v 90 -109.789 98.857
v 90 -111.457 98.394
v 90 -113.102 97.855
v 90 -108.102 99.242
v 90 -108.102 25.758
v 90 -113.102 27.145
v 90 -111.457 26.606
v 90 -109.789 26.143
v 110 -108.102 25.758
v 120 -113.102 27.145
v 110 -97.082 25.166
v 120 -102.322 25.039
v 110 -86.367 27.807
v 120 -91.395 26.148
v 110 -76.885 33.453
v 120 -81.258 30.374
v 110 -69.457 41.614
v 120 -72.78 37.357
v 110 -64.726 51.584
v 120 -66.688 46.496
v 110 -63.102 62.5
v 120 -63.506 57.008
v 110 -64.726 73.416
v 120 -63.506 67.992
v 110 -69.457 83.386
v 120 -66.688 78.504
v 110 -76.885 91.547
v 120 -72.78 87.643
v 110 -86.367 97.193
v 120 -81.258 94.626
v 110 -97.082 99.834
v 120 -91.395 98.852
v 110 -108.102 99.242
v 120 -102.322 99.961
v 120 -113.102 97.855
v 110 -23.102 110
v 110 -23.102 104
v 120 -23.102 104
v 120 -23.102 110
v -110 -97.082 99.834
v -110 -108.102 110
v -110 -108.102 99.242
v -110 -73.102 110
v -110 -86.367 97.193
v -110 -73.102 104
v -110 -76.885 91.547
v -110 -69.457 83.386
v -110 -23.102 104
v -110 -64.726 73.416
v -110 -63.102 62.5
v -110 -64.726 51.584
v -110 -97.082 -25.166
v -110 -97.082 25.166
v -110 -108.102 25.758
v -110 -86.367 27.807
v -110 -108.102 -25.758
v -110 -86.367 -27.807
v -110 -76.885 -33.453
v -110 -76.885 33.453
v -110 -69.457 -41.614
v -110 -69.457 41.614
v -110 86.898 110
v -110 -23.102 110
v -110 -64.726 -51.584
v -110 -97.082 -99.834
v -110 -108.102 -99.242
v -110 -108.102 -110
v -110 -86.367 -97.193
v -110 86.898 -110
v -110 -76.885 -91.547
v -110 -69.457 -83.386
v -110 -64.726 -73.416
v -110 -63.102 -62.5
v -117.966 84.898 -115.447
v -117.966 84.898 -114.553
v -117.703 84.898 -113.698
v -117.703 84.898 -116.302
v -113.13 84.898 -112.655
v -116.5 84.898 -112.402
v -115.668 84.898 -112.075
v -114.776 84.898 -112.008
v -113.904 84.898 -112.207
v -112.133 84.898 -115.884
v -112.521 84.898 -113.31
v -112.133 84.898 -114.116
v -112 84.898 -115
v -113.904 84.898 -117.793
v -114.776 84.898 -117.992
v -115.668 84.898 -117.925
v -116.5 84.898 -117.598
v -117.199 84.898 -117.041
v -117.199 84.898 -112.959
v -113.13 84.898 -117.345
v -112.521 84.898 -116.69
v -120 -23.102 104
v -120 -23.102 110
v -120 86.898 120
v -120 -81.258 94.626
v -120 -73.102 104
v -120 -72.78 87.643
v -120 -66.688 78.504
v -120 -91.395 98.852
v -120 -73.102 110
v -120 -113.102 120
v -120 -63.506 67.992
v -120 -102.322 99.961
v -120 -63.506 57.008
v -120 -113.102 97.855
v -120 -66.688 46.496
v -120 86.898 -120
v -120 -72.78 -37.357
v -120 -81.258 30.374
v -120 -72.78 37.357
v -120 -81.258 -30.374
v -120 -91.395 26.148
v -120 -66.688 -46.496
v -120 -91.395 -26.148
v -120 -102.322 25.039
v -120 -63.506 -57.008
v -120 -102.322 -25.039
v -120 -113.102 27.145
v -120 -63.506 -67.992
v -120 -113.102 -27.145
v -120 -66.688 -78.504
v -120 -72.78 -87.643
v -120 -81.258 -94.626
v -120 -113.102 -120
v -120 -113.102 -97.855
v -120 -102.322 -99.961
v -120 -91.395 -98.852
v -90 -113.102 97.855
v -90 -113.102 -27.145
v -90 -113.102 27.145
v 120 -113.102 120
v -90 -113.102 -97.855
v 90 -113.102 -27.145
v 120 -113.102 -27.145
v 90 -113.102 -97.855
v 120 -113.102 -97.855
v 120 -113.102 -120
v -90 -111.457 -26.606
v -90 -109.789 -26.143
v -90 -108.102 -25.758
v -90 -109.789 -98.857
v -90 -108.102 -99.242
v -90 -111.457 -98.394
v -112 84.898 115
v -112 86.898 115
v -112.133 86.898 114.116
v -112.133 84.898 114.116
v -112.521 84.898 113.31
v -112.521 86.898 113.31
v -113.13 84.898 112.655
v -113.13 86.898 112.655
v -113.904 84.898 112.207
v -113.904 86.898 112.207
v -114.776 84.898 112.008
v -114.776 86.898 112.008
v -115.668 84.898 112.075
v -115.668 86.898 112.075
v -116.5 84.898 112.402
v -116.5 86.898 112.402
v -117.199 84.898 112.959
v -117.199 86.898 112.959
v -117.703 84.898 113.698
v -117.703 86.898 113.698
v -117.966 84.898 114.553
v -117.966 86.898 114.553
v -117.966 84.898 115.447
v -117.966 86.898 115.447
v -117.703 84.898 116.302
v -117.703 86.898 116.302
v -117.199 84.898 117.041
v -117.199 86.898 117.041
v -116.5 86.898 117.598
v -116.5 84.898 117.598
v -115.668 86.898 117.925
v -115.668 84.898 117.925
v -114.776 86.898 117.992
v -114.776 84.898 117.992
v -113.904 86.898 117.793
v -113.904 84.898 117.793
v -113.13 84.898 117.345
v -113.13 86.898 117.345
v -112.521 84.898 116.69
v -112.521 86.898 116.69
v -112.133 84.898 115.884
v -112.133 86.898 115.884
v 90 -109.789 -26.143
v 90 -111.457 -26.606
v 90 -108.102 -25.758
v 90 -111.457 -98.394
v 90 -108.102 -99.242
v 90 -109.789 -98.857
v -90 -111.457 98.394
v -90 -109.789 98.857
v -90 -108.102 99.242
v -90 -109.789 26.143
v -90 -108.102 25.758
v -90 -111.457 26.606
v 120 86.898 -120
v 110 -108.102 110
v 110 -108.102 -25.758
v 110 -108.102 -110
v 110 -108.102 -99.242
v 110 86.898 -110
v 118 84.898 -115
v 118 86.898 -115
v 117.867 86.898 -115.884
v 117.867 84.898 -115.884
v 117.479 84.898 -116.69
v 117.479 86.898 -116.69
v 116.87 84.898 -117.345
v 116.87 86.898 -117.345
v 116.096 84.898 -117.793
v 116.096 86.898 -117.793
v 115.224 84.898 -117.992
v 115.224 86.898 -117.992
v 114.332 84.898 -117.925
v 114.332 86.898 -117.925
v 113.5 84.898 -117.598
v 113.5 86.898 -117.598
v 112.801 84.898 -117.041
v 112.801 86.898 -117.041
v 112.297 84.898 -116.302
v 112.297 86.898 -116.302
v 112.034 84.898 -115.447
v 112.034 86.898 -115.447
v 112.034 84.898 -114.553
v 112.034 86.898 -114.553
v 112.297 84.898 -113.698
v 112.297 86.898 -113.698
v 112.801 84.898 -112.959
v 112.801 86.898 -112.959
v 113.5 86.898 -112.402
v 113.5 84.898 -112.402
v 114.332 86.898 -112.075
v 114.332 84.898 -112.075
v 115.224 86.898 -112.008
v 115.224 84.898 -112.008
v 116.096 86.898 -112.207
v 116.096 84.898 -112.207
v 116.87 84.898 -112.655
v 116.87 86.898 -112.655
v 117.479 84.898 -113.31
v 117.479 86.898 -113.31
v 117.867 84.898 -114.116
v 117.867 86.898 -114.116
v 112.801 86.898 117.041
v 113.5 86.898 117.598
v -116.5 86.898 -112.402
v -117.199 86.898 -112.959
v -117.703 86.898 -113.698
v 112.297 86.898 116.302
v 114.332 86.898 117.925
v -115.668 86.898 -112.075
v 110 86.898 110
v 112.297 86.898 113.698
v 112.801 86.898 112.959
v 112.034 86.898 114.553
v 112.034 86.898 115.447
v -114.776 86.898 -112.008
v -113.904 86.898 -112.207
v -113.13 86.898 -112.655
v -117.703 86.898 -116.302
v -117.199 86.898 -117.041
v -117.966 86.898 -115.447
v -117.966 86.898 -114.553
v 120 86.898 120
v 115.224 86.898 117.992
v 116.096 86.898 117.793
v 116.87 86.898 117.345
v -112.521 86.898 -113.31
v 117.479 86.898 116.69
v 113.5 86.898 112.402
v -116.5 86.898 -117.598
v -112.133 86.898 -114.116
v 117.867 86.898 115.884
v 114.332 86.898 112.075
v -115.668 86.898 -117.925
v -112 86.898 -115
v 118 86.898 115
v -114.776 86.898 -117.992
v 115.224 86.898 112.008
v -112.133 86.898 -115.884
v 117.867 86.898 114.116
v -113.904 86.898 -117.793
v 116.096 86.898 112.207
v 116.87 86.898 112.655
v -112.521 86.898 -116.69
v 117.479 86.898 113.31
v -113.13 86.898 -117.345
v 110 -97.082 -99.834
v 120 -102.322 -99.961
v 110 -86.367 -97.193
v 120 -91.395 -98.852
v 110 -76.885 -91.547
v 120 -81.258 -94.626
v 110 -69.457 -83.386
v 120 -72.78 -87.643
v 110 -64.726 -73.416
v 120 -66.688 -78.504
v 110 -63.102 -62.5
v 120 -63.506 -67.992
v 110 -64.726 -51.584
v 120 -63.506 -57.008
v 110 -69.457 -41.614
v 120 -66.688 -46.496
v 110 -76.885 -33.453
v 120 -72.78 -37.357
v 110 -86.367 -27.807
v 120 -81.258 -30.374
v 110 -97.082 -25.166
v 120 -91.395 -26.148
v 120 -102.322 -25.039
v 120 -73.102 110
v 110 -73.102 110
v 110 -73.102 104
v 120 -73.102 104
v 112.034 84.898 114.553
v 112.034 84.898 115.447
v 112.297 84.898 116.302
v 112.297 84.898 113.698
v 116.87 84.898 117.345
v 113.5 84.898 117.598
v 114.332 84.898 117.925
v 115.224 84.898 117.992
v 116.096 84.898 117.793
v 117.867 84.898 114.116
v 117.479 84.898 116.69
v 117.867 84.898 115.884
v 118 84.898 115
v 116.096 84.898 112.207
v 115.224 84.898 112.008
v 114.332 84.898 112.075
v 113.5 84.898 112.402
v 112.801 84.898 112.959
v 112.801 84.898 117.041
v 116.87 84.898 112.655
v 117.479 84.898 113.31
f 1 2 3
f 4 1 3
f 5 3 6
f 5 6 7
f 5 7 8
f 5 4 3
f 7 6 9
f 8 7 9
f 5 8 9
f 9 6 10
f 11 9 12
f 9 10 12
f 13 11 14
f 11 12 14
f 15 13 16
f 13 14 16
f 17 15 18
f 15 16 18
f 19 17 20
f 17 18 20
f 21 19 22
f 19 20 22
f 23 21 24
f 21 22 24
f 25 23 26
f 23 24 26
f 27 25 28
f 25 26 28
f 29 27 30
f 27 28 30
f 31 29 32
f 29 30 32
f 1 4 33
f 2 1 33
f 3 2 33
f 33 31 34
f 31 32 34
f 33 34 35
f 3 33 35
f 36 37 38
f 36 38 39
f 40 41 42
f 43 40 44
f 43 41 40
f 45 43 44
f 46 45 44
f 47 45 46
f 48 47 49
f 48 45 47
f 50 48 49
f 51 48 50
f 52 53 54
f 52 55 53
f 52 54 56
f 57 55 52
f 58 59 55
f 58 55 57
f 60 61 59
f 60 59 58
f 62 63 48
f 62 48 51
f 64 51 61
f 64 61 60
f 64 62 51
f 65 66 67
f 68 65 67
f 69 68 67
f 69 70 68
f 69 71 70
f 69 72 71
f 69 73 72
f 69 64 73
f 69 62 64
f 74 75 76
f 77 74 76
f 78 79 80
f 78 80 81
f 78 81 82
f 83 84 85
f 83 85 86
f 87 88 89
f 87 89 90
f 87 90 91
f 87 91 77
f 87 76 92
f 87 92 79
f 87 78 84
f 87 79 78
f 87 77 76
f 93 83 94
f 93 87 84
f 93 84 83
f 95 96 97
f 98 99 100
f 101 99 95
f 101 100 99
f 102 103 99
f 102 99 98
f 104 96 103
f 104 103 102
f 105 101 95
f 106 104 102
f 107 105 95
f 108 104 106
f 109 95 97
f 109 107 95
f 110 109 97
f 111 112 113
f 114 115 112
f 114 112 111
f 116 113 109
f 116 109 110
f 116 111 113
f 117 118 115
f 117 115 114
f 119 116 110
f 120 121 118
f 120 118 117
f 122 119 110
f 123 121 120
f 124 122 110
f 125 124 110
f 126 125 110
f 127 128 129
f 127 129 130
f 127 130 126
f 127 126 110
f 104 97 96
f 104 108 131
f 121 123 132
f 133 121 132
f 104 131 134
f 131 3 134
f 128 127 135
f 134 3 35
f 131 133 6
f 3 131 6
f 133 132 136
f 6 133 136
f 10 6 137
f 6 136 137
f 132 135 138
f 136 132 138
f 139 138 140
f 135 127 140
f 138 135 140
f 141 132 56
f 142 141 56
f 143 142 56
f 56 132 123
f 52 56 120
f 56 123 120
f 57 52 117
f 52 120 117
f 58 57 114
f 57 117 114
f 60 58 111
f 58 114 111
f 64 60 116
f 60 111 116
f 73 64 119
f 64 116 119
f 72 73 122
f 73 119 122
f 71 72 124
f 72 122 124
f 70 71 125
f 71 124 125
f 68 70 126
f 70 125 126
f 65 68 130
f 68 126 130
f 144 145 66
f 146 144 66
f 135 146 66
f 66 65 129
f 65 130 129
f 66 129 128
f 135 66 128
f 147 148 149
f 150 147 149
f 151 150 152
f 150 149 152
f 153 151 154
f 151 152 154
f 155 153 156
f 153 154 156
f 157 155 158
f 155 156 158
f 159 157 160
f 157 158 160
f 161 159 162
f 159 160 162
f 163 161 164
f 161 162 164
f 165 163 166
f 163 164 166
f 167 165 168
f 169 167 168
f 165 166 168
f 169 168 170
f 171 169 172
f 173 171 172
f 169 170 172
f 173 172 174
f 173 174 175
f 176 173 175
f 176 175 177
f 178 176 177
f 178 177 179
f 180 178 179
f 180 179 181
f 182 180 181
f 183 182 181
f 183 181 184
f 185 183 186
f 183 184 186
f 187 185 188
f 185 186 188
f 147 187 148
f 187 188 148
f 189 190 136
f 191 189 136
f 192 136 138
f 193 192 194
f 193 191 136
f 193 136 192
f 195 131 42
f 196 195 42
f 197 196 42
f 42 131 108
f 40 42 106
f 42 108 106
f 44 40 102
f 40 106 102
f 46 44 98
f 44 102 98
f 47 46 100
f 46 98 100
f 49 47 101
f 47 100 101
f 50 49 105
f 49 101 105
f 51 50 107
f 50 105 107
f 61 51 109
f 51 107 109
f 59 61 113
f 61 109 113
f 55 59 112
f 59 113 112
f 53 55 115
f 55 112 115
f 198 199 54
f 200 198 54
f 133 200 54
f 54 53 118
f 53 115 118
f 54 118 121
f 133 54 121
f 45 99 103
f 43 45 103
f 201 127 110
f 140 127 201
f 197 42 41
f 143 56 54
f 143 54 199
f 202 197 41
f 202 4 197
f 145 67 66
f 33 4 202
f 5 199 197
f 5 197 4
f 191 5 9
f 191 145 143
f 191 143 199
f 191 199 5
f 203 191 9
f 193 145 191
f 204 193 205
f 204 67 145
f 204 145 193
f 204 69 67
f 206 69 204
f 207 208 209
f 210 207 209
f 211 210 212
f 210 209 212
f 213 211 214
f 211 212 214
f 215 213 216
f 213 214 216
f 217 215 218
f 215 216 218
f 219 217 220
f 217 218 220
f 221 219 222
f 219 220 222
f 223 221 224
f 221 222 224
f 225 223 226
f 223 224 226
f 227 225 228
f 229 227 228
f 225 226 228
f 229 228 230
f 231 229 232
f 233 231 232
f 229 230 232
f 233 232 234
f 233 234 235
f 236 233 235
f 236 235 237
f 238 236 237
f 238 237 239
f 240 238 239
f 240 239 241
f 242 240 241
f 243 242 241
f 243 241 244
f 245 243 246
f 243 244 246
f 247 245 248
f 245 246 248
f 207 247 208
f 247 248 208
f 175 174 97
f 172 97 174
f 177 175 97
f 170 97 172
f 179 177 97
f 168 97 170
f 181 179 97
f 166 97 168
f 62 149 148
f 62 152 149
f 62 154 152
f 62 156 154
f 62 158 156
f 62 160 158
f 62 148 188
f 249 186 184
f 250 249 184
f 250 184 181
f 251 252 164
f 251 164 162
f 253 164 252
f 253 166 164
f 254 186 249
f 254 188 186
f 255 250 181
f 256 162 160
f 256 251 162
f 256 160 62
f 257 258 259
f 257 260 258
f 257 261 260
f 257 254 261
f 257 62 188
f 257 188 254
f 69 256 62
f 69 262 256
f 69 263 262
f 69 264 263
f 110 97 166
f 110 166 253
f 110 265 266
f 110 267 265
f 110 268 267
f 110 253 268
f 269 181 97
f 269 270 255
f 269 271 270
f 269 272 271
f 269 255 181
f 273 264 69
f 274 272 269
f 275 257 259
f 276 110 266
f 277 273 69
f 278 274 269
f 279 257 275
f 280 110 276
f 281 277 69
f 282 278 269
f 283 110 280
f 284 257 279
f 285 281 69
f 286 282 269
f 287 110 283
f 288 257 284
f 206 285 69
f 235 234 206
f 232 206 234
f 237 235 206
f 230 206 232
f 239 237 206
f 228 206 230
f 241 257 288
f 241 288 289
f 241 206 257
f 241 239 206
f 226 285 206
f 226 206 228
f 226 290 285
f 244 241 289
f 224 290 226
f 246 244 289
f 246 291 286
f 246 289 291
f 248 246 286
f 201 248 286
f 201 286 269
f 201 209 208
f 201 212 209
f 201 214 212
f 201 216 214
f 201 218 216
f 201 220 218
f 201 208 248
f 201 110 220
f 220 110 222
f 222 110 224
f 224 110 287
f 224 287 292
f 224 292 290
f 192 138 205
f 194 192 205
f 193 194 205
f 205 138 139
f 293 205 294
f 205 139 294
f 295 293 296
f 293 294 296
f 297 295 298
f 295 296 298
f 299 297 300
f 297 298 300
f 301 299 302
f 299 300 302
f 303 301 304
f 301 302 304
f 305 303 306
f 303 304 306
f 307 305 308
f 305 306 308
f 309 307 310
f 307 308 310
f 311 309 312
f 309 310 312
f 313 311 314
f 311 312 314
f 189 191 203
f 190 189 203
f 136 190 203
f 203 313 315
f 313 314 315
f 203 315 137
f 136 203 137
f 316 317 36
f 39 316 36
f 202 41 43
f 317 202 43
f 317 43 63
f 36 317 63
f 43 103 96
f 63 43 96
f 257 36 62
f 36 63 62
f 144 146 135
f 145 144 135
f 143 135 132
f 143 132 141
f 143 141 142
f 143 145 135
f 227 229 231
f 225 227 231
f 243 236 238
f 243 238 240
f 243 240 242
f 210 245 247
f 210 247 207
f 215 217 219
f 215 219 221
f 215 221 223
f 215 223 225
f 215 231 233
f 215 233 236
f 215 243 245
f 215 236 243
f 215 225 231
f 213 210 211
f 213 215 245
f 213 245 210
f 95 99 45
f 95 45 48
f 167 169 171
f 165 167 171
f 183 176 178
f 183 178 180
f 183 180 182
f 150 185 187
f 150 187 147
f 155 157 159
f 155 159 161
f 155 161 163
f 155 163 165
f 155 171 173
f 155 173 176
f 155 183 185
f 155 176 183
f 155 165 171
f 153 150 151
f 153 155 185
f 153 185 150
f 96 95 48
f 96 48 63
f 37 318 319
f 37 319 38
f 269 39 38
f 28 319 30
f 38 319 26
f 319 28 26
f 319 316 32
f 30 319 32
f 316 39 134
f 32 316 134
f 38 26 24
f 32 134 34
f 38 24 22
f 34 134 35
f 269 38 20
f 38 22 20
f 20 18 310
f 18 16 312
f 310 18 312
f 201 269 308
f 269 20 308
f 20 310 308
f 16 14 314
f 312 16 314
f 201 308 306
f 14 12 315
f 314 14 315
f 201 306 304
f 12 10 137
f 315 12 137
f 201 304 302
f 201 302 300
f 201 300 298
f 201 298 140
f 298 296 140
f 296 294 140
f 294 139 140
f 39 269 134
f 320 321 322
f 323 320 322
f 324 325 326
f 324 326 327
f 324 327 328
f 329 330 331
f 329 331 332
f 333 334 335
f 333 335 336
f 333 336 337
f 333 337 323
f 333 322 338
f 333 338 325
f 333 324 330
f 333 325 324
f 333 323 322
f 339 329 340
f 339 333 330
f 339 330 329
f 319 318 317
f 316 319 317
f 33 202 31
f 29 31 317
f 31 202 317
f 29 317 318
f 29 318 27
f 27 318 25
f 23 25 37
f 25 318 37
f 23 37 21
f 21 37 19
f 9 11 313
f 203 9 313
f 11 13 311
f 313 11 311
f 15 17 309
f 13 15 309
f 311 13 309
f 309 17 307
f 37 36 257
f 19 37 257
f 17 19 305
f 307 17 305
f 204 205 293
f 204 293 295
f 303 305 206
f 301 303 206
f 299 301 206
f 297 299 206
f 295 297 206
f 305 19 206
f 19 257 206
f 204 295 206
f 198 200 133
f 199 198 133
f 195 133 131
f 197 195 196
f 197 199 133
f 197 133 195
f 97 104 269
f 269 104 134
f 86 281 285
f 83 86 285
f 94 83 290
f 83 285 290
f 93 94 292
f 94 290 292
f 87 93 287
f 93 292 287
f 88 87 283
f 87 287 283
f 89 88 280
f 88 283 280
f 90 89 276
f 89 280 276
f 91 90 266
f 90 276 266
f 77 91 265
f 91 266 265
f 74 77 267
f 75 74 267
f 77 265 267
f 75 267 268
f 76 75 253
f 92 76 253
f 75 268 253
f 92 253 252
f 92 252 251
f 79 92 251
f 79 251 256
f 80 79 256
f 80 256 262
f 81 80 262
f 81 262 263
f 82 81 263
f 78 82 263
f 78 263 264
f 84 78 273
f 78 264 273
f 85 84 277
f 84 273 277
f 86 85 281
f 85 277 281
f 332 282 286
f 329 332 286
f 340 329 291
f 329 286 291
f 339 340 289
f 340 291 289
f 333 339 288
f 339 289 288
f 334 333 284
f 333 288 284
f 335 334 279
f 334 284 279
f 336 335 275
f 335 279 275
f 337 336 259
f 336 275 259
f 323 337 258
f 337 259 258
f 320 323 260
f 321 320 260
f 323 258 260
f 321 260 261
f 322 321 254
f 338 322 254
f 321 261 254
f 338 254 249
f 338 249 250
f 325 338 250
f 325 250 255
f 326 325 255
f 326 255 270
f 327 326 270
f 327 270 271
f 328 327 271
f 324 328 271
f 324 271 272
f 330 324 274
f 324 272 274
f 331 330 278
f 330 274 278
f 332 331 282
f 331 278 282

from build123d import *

# Parameters (mm, degrees)
SKETCH2_W               = 240
SKETCH2_H               = 240
BOSS_EXTRUDE1_DEPTH     = 200
SKETCH17_W              = 220
SKETCH17_H              = 220
CUT_EXTRUDE1_DEPTH      = 195
SKETCH20_R              = 37.5
CUT_EXTRUDE3_DEPTH      = 30
SKETCH21_R              = 37.5
CUT_EXTRUDE4_DEPTH      = 30
SKETCH22_R              = 3
CUT_EXTRUDE5_DEPTH      = 2
SKETCH24_W              = 6
SKETCH24_H              = 50
CUT_EXTRUDE7_DEPTH      = 1
CUT_EXTRUDE7_DEPTH_BACK = 241


with BuildPart() as part:
    # Sketch2 → Boss-Extrude1 (new body)
    with BuildSketch(Plane(origin=(0, -113.102021597, 0), x_dir=(1, 0, 0), z_dir=(0, 1, 0))):
        Rectangle(SKETCH2_W, SKETCH2_H)
    extrude(amount=BOSS_EXTRUDE1_DEPTH)

    # Sketch17 → Cut-Extrude1 (cut)
    with BuildSketch(Plane(origin=(0, 86.897978403, 0), x_dir=(1, 0, 0), z_dir=(0, 1, 0))):
        Rectangle(SKETCH17_W, SKETCH17_H)
    extrude(amount=-CUT_EXTRUDE1_DEPTH, mode=Mode.SUBTRACT)

    # Sketch20 → Cut-Extrude3 (cut)
    with BuildSketch(Plane(origin=(120, 0, 0), x_dir=(0, 0, -1), z_dir=(1, 0, 0))):
        with Locations((-62.5, -100.602021597)):
            Circle(SKETCH20_R)
        with Locations((62.5, -100.602021597)):
            Circle(SKETCH20_R)
    extrude(amount=-CUT_EXTRUDE3_DEPTH, mode=Mode.SUBTRACT)

    # Sketch21 → Cut-Extrude4 (cut)
    with BuildSketch(Plane.ZY.offset(120)):
        with Locations((62.5, -100.602021597)):
            Circle(SKETCH21_R)
        with Locations((-62.5, -100.602021597)):
            Circle(SKETCH21_R)
    extrude(amount=-CUT_EXTRUDE4_DEPTH, mode=Mode.SUBTRACT)

    # Sketch22 → Cut-Extrude5 (cut)
    with BuildSketch(Plane(origin=(0, 86.897978403, 0), x_dir=(1, 0, 0), z_dir=(0, 1, 0))):
        with Locations((-115, 115)):
            Circle(SKETCH22_R)
        with Locations((-115, -115)):
            Circle(SKETCH22_R)
        with Locations((115, -115)):
            Circle(SKETCH22_R)
        with Locations((115, 115)):
            Circle(SKETCH22_R)
    extrude(amount=-CUT_EXTRUDE5_DEPTH, mode=Mode.SUBTRACT)

    # Sketch24 → Cut-Extrude7 (cut, two sides)
    with BuildSketch(Plane.ZY.offset(120)) as cut_extrude7_sk:
        with Locations((107, -48.102021597)):
            Rectangle(SKETCH24_W, SKETCH24_H)
    extrude(amount=CUT_EXTRUDE7_DEPTH, mode=Mode.SUBTRACT)
    extrude(cut_extrude7_sk.sketch, amount=-CUT_EXTRUDE7_DEPTH_BACK, mode=Mode.SUBTRACT)


solid = part.part
